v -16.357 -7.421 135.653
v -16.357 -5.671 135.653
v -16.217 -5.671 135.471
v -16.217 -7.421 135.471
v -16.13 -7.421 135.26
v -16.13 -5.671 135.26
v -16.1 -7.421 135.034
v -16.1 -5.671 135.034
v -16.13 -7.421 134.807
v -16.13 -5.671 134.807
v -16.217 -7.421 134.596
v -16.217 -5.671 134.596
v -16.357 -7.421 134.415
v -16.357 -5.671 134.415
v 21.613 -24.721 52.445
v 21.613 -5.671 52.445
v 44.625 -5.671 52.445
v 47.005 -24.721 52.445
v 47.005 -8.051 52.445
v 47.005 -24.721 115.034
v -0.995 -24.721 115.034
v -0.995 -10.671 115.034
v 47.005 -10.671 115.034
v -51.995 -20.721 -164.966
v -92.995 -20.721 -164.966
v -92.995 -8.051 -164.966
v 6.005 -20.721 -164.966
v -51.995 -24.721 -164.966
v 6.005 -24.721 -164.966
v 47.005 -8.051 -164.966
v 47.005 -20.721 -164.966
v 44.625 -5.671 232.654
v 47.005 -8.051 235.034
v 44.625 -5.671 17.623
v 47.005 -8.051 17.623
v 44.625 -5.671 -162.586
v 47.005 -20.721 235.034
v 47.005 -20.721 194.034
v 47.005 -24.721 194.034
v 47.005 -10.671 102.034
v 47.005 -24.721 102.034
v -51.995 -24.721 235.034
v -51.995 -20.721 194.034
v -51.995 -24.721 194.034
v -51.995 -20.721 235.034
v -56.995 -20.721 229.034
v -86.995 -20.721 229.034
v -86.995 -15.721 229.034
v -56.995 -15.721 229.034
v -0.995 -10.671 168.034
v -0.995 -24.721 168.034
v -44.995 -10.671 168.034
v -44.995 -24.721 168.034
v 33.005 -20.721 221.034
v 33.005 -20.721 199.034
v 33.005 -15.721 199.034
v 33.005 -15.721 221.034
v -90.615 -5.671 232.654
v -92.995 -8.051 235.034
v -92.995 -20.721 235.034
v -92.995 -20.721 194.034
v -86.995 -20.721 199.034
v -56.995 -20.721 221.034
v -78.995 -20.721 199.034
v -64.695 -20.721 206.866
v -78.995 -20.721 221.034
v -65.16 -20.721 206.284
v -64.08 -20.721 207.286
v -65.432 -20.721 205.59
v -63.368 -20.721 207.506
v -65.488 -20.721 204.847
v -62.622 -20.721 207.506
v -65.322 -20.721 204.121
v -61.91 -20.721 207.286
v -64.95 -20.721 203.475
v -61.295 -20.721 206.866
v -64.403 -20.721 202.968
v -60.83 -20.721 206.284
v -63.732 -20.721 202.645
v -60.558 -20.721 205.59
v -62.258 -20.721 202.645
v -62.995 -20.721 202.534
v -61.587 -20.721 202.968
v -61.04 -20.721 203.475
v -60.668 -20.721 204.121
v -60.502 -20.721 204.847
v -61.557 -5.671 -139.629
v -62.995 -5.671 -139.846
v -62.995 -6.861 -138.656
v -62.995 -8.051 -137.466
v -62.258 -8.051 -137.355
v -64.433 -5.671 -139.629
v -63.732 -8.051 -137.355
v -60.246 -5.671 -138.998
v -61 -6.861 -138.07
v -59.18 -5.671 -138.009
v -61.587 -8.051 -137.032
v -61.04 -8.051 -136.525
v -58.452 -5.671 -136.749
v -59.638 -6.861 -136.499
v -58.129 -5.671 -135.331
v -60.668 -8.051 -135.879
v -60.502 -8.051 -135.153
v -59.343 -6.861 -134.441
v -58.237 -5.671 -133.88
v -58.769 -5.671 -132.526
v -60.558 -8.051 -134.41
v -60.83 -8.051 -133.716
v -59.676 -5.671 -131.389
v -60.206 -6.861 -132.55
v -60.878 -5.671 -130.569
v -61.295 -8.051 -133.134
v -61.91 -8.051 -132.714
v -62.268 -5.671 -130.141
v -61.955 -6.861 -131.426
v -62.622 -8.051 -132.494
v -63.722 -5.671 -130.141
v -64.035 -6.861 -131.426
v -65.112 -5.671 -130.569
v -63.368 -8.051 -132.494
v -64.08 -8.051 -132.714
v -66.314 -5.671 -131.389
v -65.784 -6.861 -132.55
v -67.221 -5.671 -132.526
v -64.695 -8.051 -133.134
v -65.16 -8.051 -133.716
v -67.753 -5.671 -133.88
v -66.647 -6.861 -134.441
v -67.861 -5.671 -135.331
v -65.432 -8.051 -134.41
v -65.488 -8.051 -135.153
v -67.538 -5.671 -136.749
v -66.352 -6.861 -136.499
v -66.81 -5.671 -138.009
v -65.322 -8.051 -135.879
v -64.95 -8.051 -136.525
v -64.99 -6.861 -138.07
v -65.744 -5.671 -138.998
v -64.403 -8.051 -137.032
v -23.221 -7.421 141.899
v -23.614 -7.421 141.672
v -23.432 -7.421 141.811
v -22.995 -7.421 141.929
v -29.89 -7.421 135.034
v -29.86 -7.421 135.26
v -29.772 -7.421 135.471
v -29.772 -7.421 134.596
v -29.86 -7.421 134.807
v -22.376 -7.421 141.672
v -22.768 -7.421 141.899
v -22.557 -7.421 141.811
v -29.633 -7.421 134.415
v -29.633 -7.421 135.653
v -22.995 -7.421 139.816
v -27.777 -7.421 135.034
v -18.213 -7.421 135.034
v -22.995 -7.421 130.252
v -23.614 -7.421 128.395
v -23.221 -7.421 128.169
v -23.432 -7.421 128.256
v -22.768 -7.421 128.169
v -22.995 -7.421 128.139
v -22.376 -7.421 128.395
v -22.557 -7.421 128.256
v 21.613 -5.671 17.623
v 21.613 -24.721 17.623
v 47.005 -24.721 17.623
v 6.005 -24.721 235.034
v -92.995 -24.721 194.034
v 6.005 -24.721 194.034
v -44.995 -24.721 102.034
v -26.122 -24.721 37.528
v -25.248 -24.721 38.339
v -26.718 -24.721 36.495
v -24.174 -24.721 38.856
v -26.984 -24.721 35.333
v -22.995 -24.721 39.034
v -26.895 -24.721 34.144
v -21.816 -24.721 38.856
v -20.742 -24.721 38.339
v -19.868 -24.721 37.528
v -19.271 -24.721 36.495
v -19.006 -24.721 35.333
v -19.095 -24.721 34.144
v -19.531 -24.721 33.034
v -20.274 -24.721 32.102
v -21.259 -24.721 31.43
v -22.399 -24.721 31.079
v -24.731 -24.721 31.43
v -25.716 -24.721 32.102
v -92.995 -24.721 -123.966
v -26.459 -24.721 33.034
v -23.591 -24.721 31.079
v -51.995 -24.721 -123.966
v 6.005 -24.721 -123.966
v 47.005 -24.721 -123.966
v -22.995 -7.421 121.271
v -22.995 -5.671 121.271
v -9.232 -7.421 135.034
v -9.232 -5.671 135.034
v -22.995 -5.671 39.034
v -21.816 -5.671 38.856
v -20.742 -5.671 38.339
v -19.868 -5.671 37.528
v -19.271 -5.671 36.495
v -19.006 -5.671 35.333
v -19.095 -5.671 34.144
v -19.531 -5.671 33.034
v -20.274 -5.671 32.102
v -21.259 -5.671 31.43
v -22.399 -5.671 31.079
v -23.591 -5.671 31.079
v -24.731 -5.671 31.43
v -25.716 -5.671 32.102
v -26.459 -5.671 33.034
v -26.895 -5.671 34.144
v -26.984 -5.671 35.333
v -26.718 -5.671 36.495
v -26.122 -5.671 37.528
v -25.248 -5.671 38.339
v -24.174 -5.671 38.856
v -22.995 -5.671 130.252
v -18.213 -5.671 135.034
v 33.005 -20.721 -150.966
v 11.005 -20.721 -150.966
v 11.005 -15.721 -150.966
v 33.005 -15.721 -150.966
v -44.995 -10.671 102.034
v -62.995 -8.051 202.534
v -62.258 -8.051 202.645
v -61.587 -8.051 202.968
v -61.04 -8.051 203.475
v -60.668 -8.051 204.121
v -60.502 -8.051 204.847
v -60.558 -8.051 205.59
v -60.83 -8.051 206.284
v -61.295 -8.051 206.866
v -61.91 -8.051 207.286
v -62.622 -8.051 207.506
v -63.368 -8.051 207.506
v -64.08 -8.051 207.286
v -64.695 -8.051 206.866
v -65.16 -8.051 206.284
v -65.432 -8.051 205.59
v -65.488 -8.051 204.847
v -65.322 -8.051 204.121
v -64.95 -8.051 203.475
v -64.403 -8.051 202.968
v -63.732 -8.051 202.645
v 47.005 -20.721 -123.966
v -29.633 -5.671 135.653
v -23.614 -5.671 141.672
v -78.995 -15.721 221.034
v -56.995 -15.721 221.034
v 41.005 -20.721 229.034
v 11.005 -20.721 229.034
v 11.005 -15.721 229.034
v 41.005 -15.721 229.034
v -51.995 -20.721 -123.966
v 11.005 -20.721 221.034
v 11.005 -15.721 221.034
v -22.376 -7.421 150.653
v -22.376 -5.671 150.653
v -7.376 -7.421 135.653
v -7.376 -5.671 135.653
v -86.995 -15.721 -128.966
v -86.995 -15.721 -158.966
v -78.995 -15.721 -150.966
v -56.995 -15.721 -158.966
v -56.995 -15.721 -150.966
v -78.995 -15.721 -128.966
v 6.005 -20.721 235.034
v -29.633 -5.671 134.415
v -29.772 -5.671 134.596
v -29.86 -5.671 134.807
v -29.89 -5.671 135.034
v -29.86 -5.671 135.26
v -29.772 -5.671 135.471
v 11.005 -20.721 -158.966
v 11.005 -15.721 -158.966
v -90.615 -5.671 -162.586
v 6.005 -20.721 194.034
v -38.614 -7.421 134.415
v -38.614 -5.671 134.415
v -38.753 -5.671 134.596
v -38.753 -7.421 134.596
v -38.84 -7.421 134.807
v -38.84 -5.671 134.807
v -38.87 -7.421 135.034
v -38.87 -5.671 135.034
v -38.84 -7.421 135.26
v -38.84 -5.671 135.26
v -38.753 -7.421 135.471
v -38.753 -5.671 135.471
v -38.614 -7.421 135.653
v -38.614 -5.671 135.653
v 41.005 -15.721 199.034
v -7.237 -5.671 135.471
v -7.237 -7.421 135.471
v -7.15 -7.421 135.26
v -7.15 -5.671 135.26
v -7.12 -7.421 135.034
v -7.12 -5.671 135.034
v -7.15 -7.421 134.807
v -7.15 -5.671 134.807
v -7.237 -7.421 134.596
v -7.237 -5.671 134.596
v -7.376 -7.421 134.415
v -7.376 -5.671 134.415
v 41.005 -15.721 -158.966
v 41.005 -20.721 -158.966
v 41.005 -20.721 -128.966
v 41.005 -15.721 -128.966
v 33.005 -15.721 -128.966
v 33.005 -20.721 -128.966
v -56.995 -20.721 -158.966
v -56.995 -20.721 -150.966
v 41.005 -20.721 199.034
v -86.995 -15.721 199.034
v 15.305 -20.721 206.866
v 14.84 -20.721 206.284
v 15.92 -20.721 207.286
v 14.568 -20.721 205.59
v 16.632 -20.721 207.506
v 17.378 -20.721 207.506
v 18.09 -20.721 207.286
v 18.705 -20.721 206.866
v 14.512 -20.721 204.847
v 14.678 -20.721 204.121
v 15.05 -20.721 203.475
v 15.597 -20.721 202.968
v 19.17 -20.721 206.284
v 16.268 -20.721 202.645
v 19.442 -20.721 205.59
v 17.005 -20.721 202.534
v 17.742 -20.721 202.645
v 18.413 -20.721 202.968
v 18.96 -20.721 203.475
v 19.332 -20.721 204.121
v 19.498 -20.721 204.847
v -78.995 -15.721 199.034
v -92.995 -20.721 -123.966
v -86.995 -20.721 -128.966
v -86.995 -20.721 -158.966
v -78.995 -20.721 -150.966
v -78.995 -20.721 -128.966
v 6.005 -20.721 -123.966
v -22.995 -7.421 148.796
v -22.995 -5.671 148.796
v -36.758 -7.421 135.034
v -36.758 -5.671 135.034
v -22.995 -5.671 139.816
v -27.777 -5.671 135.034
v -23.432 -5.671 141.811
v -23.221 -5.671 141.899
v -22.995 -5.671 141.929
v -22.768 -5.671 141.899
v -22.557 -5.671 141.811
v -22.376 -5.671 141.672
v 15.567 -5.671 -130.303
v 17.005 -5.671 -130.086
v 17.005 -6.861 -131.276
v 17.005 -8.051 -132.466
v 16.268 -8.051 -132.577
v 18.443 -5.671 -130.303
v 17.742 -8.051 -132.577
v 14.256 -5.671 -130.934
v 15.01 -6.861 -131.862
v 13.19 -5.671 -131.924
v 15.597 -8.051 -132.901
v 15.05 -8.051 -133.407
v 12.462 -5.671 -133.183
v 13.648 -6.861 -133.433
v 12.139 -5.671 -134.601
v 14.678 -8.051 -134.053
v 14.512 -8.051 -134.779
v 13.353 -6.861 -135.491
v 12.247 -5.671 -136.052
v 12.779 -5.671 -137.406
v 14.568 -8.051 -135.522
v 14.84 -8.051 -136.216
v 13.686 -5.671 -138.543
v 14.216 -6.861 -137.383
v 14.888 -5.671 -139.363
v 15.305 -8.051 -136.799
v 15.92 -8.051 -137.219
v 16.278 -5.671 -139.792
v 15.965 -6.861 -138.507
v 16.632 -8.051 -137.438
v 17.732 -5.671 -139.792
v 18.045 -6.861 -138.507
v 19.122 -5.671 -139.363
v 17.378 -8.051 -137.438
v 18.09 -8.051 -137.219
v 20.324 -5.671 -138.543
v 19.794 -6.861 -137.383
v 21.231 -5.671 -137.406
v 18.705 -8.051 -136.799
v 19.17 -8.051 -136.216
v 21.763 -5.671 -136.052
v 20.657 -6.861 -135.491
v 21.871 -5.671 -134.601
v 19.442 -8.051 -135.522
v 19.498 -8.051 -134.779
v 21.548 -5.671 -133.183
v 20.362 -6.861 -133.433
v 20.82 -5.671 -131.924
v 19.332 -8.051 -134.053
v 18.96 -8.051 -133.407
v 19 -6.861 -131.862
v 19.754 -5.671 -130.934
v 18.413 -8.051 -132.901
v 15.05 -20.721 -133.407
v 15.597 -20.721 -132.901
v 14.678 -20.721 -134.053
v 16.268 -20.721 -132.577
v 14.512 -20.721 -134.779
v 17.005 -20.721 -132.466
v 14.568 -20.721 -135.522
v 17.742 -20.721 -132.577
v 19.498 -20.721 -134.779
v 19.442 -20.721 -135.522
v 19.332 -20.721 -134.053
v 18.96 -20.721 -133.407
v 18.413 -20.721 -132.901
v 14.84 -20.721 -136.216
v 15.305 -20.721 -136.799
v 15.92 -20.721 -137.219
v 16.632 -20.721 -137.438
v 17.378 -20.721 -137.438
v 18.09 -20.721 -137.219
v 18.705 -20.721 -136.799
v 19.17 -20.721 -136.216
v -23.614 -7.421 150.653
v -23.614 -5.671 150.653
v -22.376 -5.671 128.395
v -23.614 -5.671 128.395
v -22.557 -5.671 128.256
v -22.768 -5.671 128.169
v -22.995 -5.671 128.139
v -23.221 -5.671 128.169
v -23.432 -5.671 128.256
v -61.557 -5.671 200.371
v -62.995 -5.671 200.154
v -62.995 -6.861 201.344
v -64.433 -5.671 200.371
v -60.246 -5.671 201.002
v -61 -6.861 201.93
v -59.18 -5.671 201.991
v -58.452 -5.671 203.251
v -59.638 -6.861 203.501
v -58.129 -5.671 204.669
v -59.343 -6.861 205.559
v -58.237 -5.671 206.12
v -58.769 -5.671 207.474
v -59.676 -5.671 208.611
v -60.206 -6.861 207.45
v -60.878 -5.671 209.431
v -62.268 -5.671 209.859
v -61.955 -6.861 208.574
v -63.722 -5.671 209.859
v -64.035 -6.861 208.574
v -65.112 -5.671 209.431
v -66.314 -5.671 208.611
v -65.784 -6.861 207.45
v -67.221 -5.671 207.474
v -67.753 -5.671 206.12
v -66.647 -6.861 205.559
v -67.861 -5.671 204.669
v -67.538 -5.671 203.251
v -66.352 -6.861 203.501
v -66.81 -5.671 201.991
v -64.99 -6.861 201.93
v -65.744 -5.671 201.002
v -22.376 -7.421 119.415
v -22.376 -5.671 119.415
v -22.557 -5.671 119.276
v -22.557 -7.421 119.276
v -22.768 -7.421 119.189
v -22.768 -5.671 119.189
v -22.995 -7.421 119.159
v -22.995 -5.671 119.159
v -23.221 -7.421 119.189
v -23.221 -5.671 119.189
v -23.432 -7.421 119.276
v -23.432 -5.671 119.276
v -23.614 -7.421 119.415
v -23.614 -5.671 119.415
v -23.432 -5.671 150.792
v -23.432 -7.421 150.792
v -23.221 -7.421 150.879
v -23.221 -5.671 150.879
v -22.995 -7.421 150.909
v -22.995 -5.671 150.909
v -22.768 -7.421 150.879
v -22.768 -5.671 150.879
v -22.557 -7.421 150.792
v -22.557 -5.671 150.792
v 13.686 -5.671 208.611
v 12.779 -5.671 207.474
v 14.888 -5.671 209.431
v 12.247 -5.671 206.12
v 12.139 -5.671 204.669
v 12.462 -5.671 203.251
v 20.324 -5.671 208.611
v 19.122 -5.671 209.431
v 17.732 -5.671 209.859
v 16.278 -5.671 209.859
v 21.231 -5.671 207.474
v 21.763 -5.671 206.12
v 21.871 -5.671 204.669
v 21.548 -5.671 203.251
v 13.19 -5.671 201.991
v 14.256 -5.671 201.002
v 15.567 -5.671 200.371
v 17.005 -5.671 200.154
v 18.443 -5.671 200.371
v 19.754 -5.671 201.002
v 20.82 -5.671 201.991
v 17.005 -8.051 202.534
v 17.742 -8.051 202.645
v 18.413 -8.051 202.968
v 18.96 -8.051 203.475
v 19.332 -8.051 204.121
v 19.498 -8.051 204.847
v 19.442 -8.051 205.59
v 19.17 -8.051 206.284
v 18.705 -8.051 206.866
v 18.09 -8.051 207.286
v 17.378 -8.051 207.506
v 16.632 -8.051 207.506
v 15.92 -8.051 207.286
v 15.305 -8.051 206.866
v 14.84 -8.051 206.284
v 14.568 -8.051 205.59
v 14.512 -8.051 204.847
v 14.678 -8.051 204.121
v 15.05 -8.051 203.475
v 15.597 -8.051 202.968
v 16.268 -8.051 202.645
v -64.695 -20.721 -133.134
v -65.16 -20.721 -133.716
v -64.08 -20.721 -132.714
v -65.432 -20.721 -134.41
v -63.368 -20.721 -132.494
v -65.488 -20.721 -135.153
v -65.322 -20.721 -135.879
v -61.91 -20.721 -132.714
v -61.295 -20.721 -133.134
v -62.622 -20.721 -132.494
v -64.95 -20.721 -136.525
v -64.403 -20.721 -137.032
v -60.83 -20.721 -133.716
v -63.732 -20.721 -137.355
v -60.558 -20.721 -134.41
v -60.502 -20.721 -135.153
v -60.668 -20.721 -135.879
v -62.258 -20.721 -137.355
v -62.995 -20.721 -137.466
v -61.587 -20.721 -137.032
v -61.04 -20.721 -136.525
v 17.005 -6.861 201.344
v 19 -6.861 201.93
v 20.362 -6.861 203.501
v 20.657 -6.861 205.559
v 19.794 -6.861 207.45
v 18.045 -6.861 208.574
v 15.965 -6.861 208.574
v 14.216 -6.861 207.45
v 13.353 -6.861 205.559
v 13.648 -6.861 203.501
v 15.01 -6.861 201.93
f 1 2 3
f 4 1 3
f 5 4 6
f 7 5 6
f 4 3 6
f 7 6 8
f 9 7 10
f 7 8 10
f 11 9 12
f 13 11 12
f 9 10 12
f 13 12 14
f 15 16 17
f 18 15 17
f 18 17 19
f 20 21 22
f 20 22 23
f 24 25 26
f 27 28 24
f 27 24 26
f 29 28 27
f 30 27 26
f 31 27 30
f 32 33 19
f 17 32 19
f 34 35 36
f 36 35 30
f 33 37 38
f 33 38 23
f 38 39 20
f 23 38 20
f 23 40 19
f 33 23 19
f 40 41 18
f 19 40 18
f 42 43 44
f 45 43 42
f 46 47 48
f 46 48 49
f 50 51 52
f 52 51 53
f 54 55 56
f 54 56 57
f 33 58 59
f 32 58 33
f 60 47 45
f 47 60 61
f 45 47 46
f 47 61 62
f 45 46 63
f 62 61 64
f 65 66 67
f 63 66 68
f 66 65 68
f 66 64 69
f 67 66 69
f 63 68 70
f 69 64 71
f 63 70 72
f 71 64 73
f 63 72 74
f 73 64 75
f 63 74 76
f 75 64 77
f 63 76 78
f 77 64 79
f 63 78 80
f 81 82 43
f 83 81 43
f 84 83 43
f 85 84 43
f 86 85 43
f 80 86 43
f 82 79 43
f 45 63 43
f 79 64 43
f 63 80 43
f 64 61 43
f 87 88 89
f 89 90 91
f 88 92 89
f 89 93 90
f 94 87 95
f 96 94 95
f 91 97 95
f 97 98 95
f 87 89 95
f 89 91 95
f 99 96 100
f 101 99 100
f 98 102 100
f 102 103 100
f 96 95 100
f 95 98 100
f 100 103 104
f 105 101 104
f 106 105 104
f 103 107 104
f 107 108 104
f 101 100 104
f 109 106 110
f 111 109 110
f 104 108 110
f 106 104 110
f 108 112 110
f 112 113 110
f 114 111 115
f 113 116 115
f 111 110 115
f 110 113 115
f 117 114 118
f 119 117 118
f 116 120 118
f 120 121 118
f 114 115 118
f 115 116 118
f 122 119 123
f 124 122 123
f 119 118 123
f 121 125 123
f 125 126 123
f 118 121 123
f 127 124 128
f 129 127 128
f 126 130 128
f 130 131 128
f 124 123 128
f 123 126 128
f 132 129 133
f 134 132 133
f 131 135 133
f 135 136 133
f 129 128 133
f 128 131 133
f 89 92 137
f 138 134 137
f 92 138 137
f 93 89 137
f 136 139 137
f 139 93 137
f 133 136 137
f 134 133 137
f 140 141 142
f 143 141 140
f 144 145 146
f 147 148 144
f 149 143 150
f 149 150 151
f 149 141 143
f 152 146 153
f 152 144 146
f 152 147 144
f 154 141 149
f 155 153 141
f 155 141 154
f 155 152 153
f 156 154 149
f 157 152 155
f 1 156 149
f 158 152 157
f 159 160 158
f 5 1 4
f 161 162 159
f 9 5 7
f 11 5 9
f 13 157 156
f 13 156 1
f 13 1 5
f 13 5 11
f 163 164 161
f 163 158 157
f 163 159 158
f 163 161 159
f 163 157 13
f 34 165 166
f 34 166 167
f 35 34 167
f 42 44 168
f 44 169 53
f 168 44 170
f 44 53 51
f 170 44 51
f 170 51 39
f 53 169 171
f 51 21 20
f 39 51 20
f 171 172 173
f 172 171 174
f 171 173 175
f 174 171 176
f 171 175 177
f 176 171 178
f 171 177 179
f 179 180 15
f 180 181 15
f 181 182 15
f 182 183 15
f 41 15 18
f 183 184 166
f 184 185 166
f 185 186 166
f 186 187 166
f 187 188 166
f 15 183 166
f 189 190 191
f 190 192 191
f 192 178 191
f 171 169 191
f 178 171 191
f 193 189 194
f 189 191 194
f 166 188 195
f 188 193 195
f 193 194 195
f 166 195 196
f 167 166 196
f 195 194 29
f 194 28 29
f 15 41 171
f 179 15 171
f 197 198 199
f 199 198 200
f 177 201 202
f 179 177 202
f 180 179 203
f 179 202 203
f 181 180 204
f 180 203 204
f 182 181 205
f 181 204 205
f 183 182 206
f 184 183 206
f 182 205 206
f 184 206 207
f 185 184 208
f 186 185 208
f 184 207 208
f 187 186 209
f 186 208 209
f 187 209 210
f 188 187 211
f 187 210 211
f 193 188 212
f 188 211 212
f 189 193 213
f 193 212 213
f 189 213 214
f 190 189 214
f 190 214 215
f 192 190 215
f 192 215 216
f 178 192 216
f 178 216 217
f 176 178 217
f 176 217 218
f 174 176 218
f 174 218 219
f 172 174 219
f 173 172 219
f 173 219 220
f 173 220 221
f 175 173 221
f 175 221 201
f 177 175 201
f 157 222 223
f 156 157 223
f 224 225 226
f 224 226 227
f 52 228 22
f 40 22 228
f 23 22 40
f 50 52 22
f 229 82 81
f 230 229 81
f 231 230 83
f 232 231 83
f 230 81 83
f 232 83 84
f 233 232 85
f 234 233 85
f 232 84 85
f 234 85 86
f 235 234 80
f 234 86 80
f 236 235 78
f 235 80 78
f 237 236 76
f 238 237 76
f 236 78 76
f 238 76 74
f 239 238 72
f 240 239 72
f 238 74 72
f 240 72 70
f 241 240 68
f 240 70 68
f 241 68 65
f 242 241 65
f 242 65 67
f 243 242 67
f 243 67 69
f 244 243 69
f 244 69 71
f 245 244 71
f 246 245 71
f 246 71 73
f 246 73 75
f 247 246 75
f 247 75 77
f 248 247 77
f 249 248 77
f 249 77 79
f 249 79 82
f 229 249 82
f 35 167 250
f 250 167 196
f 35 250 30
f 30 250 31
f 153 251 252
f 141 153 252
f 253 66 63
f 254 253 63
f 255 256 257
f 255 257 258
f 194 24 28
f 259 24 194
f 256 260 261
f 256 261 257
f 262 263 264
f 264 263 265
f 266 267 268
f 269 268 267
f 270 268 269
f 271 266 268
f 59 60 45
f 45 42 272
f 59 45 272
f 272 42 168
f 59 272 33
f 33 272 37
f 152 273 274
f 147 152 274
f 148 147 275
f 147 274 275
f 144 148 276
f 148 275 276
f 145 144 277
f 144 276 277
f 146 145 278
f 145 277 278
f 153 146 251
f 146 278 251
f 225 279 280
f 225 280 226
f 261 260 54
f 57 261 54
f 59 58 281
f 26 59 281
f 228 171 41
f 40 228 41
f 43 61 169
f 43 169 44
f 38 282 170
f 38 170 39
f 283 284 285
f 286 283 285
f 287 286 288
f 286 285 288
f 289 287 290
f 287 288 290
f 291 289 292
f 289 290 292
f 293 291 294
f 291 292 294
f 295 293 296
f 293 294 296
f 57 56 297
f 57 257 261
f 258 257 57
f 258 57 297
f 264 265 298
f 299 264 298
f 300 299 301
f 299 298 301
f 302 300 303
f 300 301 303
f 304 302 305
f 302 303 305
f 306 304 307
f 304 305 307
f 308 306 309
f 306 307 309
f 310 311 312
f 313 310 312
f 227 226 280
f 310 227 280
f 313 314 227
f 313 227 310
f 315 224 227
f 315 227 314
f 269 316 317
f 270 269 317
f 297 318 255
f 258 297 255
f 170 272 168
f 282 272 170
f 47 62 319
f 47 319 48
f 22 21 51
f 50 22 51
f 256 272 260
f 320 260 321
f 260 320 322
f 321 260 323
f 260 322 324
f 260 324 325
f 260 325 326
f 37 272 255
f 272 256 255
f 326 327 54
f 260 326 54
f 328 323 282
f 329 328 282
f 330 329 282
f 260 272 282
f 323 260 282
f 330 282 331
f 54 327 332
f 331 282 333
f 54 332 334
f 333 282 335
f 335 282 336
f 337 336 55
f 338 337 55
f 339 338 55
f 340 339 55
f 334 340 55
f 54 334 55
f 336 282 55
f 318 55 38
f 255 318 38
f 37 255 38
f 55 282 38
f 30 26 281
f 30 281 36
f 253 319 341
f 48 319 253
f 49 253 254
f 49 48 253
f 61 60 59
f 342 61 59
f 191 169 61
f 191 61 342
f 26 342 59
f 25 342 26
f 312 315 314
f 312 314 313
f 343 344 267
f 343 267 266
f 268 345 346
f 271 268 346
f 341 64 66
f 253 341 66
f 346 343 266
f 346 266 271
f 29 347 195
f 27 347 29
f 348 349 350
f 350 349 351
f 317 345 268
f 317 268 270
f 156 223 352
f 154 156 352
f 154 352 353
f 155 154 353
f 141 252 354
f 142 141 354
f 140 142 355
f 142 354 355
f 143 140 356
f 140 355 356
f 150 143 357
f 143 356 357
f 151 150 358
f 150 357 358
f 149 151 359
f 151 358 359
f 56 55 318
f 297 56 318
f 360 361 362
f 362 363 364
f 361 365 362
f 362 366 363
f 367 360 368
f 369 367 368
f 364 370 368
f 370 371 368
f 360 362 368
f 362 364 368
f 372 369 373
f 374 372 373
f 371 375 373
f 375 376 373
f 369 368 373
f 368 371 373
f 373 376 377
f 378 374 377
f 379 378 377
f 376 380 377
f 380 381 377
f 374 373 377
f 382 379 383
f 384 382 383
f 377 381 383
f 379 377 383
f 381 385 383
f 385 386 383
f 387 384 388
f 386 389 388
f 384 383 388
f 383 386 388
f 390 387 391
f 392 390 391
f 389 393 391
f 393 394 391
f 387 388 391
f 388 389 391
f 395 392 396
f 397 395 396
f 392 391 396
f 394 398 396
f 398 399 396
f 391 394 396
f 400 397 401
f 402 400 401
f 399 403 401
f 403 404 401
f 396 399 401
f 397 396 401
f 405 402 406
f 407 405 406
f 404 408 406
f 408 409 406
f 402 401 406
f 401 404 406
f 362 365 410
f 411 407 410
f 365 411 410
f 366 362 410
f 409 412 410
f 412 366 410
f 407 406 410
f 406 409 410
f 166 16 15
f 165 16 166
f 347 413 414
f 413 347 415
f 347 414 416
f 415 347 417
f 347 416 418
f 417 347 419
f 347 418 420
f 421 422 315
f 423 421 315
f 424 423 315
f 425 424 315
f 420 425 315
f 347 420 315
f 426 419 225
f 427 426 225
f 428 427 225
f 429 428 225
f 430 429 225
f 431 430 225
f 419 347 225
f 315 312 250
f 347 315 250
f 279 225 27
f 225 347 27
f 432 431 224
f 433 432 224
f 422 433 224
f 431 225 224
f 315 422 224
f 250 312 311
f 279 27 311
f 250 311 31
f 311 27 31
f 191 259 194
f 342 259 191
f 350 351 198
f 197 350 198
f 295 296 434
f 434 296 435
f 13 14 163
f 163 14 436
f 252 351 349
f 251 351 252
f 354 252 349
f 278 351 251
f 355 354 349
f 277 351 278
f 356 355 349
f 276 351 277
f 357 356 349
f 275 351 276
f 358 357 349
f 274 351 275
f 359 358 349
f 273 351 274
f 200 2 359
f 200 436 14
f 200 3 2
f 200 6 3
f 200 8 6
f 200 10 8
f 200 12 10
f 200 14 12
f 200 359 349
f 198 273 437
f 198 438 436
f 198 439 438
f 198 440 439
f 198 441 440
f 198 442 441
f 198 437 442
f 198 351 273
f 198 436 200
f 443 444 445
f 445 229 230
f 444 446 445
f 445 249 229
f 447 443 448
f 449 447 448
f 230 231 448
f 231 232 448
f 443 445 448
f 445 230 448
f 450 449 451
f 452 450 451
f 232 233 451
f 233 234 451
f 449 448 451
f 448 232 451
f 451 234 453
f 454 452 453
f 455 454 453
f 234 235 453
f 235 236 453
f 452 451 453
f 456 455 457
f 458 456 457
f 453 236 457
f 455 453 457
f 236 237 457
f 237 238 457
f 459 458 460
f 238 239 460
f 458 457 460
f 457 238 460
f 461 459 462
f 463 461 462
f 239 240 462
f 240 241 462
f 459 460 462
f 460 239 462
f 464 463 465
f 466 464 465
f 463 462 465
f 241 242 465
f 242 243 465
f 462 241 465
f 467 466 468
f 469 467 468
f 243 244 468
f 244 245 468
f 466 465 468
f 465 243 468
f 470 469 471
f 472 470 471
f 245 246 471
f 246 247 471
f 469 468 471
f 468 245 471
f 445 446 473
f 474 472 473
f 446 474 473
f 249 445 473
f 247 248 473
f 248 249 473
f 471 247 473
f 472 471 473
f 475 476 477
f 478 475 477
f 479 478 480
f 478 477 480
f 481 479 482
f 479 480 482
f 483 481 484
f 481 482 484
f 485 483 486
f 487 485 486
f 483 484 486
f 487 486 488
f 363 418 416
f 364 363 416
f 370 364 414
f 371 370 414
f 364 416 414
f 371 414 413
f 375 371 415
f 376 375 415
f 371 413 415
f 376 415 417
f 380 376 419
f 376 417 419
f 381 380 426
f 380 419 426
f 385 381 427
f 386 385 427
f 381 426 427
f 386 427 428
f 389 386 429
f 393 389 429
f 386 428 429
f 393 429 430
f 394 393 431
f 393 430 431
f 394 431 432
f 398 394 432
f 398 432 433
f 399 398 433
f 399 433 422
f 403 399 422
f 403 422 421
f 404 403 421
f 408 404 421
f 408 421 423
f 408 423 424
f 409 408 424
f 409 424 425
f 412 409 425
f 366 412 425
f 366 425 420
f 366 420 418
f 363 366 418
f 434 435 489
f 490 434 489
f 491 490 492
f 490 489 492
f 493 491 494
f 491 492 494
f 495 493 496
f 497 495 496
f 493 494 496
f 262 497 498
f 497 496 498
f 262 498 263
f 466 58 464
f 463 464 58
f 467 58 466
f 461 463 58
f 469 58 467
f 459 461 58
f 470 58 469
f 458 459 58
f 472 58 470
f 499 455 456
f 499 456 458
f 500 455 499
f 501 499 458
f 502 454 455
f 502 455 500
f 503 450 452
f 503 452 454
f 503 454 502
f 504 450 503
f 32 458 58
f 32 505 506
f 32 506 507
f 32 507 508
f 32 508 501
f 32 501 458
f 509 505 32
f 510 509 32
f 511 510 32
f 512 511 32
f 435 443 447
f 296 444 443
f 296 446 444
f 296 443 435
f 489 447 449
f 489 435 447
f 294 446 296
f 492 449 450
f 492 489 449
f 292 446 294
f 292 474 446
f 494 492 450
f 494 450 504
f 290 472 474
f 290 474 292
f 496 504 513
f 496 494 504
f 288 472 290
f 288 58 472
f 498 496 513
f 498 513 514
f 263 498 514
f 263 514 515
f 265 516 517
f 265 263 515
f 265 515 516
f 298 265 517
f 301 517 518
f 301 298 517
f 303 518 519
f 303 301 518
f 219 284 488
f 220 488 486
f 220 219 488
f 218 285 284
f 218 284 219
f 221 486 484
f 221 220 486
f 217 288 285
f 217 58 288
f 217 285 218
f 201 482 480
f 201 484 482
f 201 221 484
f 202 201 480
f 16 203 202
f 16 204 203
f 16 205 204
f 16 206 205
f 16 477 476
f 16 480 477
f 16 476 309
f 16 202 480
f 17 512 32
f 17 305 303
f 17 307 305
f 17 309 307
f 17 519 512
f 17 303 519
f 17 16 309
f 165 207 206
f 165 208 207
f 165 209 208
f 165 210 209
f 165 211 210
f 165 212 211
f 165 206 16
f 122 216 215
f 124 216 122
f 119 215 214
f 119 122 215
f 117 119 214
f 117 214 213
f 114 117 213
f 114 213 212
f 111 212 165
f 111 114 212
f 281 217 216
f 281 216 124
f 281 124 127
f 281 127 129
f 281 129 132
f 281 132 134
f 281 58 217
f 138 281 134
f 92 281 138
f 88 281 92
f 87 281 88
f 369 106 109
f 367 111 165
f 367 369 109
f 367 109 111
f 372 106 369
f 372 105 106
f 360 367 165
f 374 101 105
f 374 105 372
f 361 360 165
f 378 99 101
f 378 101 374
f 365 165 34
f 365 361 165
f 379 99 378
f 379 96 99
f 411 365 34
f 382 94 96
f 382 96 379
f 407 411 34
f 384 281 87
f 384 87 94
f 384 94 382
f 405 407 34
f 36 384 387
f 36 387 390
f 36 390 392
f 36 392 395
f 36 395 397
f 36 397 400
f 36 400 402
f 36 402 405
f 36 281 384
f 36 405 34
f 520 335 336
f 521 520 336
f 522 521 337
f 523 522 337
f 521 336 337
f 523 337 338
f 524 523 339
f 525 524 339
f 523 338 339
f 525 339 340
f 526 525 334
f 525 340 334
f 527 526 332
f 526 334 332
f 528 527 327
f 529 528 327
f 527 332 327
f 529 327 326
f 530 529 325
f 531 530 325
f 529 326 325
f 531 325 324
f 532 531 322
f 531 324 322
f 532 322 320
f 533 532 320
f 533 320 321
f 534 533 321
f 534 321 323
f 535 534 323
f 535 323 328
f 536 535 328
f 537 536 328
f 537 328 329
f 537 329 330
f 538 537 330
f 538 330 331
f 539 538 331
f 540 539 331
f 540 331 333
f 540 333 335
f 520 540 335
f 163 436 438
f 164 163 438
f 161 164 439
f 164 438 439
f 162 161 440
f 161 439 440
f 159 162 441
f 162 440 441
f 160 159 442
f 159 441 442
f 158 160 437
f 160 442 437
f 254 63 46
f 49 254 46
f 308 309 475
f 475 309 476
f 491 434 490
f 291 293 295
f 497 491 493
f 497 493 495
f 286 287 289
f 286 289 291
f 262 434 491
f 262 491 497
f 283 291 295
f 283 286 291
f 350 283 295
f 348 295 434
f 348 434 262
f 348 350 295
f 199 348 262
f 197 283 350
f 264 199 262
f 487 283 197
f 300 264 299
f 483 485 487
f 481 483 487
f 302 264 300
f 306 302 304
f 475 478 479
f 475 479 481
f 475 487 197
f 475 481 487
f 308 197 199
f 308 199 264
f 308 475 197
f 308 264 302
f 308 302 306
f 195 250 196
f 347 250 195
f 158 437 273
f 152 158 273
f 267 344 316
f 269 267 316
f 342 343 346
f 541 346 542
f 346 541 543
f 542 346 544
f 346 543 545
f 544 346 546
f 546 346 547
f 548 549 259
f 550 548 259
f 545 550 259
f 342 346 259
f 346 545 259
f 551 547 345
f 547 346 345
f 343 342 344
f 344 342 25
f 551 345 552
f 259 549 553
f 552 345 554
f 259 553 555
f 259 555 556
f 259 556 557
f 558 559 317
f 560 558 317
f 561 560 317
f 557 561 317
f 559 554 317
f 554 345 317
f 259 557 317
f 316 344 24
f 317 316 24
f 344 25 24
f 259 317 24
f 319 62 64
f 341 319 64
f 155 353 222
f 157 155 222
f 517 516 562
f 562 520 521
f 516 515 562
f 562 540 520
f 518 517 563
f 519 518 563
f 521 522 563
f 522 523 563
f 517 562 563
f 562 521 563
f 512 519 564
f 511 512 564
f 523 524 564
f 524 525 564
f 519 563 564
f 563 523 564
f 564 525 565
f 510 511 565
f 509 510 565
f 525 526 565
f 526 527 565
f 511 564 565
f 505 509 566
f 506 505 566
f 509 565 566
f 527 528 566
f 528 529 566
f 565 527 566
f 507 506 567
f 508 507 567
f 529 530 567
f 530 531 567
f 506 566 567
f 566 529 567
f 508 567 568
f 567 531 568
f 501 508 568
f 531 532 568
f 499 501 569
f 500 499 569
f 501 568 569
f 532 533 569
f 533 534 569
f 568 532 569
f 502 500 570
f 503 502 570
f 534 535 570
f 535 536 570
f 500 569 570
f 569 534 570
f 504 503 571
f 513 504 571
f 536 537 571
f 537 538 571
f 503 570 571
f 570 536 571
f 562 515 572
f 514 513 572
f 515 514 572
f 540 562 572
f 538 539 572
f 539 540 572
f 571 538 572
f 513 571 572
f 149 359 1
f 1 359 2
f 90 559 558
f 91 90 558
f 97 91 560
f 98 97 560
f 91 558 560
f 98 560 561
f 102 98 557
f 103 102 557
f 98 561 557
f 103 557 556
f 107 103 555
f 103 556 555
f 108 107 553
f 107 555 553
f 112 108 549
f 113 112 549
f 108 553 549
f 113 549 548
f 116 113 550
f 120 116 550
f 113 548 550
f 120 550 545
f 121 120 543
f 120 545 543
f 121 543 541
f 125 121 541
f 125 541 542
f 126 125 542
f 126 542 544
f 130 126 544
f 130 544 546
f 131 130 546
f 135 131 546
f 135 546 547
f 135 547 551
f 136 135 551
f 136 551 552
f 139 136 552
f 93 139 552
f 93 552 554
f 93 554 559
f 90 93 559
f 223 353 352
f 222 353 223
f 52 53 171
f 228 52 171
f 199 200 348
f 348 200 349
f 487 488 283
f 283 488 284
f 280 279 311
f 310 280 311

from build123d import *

# Parameters (mm, degrees)
BOSS_EXTRUDE1_DEPTH = 4
SKETCH2_W           = 140
SKETCH2_H           = 400
BOSS_EXTRUDE2_DEPTH = 15.05
SKETCH3_W           = 8
SKETCH3_H           = 22
SKETCH3_H_2         = 8
SKETCH3_W_2         = 22
SKETCH3_R           = 2.5
CUT_EXTRUDE1_DEPTH  = 5
CUT_EXTRUDE2_REACH  = 255.21
SKETCH4_R           = 2.5
CHAMFER1_SIZE       = 2.38
CUT_EXTRUDE3_REACH  = 255.48
SKETCH5_R           = 4
CUT_EXTRUDE4_DEPTH  = 1.75
SKETCH7_W           = 50
SKETCH7_H           = 13
CUT_EXTRUDE5_DEPTH  = 14.05
CUT_EXTRUDE6_REACH  = 255.48
SKETCH8_W           = 25.391909776
SKETCH8_H           = 34.82217309


with BuildPart() as part:
    # Sketch1 → Boss-Extrude1 (new body)
    with BuildSketch(Plane(origin=(0, -20.720705818, 0), x_dir=(1, 0, 0), z_dir=(0, 1, 0))):
        Polygon((6.005034784, -235.03386434), (6.005034784, -194.03386434), (47.005034784, -194.03386434), (47.005034784, 123.96613566), (6.005034784, 123.96613566), (6.005034784, 164.96613566), (-51.994965216, 164.96613566), (-51.994965216, 123.96613566), (-92.994965216, 123.96613566), (-92.994965216, -194.03386434), (-51.994965216, -194.03386434), (-51.994965216, -235.03386434), align=None)
    extrude(amount=-BOSS_EXTRUDE1_DEPTH)

    # Sketch2 → Boss-Extrude2 (add)
    with BuildSketch(Plane(origin=(0, -20.720705818, 0), x_dir=(1, 0, 0), z_dir=(0, 1, 0))):
        with Locations((-22.994965216, -35.03386434)):
            Rectangle(SKETCH2_W, SKETCH2_H)
    extrude(amount=BOSS_EXTRUDE2_DEPTH)

    # Sketch3 → Cut-Extrude1 (cut)
    # profile 1 of 14: a face of its own
    with BuildSketch(Plane.XZ.offset(20.720705818)):
        with Locations((37.005034784, 210.03386434)):
            Rectangle(SKETCH3_W, SKETCH3_H)
    # profile 2 of 14: a face of its own
    with BuildSketch(Plane.XZ.offset(20.720705818)):
        with Locations((37.005034784, 225.03386434)):
            Rectangle(SKETCH3_W, SKETCH3_H_2)
    # profile 3 of 14: a face of its own
    with BuildSketch(Plane.XZ.offset(20.720705818)):
        with Locations((22.005034784, 225.03386434)):
            Rectangle(SKETCH3_W_2, SKETCH3_H_2)
    # profile 4 of 14: a face of its own
    with BuildSketch(Plane.XZ.offset(20.720705818)):
        with Locations((-67.994965216, 225.03386434)):
            Rectangle(SKETCH3_W_2, SKETCH3_H_2)
    # profile 5 of 14: a face of its own
    with BuildSketch(Plane.XZ.offset(20.720705818)):
        with Locations((-82.994965216, 210.03386434)):
            Rectangle(SKETCH3_W, SKETCH3_H)
    # profile 6 of 14: a face of its own
    with BuildSketch(Plane.XZ.offset(20.720705818)):
        with Locations((-82.994965216, 225.03386434)):
            Rectangle(SKETCH3_W, SKETCH3_H_2)
        with Locations((-82.994965216, 225.03386434)):
            Circle(SKETCH3_R, mode=Mode.SUBTRACT)
    # profile 7 of 14: a face of its own
    with BuildSketch(Plane.XZ.offset(20.720705818)):
        with Locations((-82.994965216, 225.03386434)):
            Circle(SKETCH3_R)
    # profile 8 of 14: a face of its own
    with BuildSketch(Plane.XZ.offset(20.720705818)):
        with Locations((-67.994965216, -154.96613566)):
            Rectangle(SKETCH3_W_2, SKETCH3_H_2)
    # profile 9 of 14: a face of its own
    with BuildSketch(Plane.XZ.offset(20.720705818)):
        with Locations((-82.994965216, -139.96613566)):
            Rectangle(SKETCH3_W, SKETCH3_H)
    # profile 10 of 14: a face of its own
    with BuildSketch(Plane.XZ.offset(20.720705818)):
        with Locations((-82.994965216, -154.96613566)):
            Rectangle(SKETCH3_W, SKETCH3_H_2)
        with Locations((-82.994965216, -154.96613566)):
            Circle(SKETCH3_R, mode=Mode.SUBTRACT)
    # profile 11 of 14: a face of its own
    with BuildSketch(Plane.XZ.offset(20.720705818)):
        with Locations((-82.994965216, -154.96613566)):
            Circle(SKETCH3_R)
    # profile 12 of 14: a face of its own
    with BuildSketch(Plane.XZ.offset(20.720705818)):
        with Locations((37.005034784, -154.96613566)):
            Rectangle(SKETCH3_W, SKETCH3_H_2)
    # profile 13 of 14: a face of its own
    with BuildSketch(Plane.XZ.offset(20.720705818)):
        with Locations((22.005034784, -154.96613566)):
            Rectangle(SKETCH3_W_2, SKETCH3_H_2)
    # profile 14 of 14: a face of its own
    with BuildSketch(Plane.XZ.offset(20.720705818)):
        with Locations((37.005034784, -139.96613566)):
            Rectangle(SKETCH3_W, SKETCH3_H)
    extrude(amount=-CUT_EXTRUDE1_DEPTH, mode=Mode.SUBTRACT)

    # Sketch4 → Cut-Extrude2 (cut, up to next)
    with BuildSketch(Plane.XZ.offset(20.720705818), mode=Mode.PRIVATE) as cut_extrude2_sk1:
        with Locations(Location((-62.994965216, -134.96613566, 0), (0, 0, 270))):
            Circle(SKETCH4_R)
    cut_extrude2_tool1 = extrude(cut_extrude2_sk1.sketch, amount=-CUT_EXTRUDE2_REACH, mode=Mode.PRIVATE) & part.part
    # Sketch4 → Cut-Extrude2 (cut, up to next)
    with BuildSketch(Plane.XZ.offset(20.720705818), mode=Mode.PRIVATE) as cut_extrude2_sk2:
        with Locations(Location((17.005034784, -134.96613566, 0), (0, 0, 90))):
            Circle(SKETCH4_R)
    cut_extrude2_tool2 = extrude(cut_extrude2_sk2.sketch, amount=-CUT_EXTRUDE2_REACH, mode=Mode.PRIVATE) & part.part
    # Sketch4 → Cut-Extrude2 (cut, up to next)
    with BuildSketch(Plane.XZ.offset(20.720705818), mode=Mode.PRIVATE) as cut_extrude2_sk3:
        with Locations(Location((-62.994965216, 205.03386434, 0), (0, 0, 270))):
            Circle(SKETCH4_R)
    cut_extrude2_tool3 = extrude(cut_extrude2_sk3.sketch, amount=-CUT_EXTRUDE2_REACH, mode=Mode.PRIVATE) & part.part
    # Sketch4 → Cut-Extrude2 (cut, up to next)
    with BuildSketch(Plane.XZ.offset(20.720705818), mode=Mode.PRIVATE) as cut_extrude2_sk4:
        with Locations(Location((17.005034784, 205.03386434, 0), (0, 0, 270))):
            Circle(SKETCH4_R)
    cut_extrude2_tool4 = extrude(cut_extrude2_sk4.sketch, amount=-CUT_EXTRUDE2_REACH, mode=Mode.PRIVATE) & part.part
    add(cut_extrude2_tool1.solids().sort_by_distance((-62.994965, -20.720706, -134.966136))[0], mode=Mode.SUBTRACT)
    add(cut_extrude2_tool2.solids().sort_by_distance((17.005035, -20.720706, -134.966136))[0], mode=Mode.SUBTRACT)
    add(cut_extrude2_tool3.solids().sort_by_distance((-62.994965, -20.720706, 205.033864))[0], mode=Mode.SUBTRACT)
    add(cut_extrude2_tool4.solids().sort_by_distance((17.005035, -20.720706, 205.033864))[0], mode=Mode.SUBTRACT)

    # Chamfer1
    chamfer1_edges = [part.edges().sort_by_distance(p)[0] for p in [
        (17.005034784, -5.670705818, -137.46613566),
        (-62.994965216, -5.670705818, 207.53386434),
        (17.005034784, -5.670705818, 207.53386434),
        (-62.994965216, -5.670705818, -132.46613566),
        (-92.994965216, -5.670705818, 35.03386434),
        (-22.994965216, -5.670705818, 235.03386434),
        (47.005034784, -5.670705818, 35.03386434),
        (-22.994965216, -5.670705818, -164.96613566),
    ]]
    chamfer(chamfer1_edges, length=CHAMFER1_SIZE)

    # Sketch5 → Cut-Extrude3 (cut, up to next)
    with BuildSketch(Plane(origin=(0, -5.670705818, 0), x_dir=(1, 0, 0), z_dir=(0, 1, 0)), mode=Mode.PRIVATE) as cut_extrude3_sk1:
        with Locations(Location((-22.994965216, -35.03386434, 0), (0, 0, 270))):
            Circle(SKETCH5_R)
    cut_extrude3_tool1 = extrude(cut_extrude3_sk1.sketch, amount=-CUT_EXTRUDE3_REACH, mode=Mode.PRIVATE) & part.part
    add(cut_extrude3_tool1.solids().sort_by_distance((-22.994965, -5.670706, 35.033864))[0], mode=Mode.SUBTRACT)

    # Sketch6 → Cut-Extrude4 (cut)
    # profile 1 of 2: a face of its own
    with BuildSketch(Plane(origin=(0, -5.670705818, 0), x_dir=(1, 0, 0), z_dir=(0, 1, 0))):
        with BuildLine():
            Line((-38.613683649, -135.652582773), (-23.613683649, -150.652582773))
            ThreePointArc((-23.613683649, -150.652582773), (-22.994965216, -150.90886434), (-22.376246782, -150.652582773))
            Line((-22.376246782, -150.652582773), (-7.376246782, -135.652582773))
            ThreePointArc((-7.376246782, -135.652582773), (-7.119965216, -135.03386434), (-7.376246782, -134.415145906))
            Line((-7.376246782, -134.415145906), (-22.376246782, -119.415145906))
            ThreePointArc((-22.376246782, -119.415145906), (-22.994965216, -119.15886434), (-23.613683649, -119.415145906))
            Line((-23.613683649, -119.415145906), (-38.613683649, -134.415145906))
            ThreePointArc((-38.613683649, -134.415145906), (-38.869965216, -135.03386434), (-38.613683649, -135.652582773))
        make_face()
        Polygon((-9.232402083, -135.03386434), (-22.994965216, -148.796427473), (-36.757528349, -135.03386434), (-22.994965216, -121.271301207), align=None, mode=Mode.SUBTRACT)
    # profile 2 of 2: a face of its own
    with BuildSketch(Plane(origin=(0, -5.670705818, 0), x_dir=(1, 0, 0), z_dir=(0, 1, 0))):
        with BuildLine():
            Line((-22.376246782, -141.672326652), (-16.356502903, -135.652582773))
            ThreePointArc((-16.356502903, -135.652582773), (-16.100221337, -135.03386434), (-16.356502903, -134.415145906))
            Line((-16.356502903, -134.415145906), (-22.376246782, -128.395402027))
            ThreePointArc((-22.376246782, -128.395402027), (-22.994965216, -128.139120461), (-23.613683649, -128.395402027))
            Line((-23.613683649, -128.395402027), (-29.633427528, -134.415145906))
            ThreePointArc((-29.633427528, -134.415145906), (-29.889709095, -135.03386434), (-29.633427528, -135.652582773))
            Line((-29.633427528, -135.652582773), (-23.613683649, -141.672326652))
            ThreePointArc((-23.613683649, -141.672326652), (-22.994965216, -141.928608219), (-22.376246782, -141.672326652))
        make_face()
        Polygon((-22.994965216, -130.251557328), (-18.212658204, -135.03386434), (-22.994965216, -139.816171352), (-27.777272227, -135.03386434), align=None, mode=Mode.SUBTRACT)
    extrude(amount=-CUT_EXTRUDE4_DEPTH, mode=Mode.SUBTRACT)

    # Sketch7 → Cut-Extrude5 (cut)
    with BuildSketch(Plane.XZ.offset(24.720705818)):
        Polygon((-0.994965216, 115.03386434), (-0.994965216, 168.03386434), (-44.994965216, 168.03386434), (-44.994965216, 102.03386434), (-0.994965216, 102.03386434), align=None)
        with Locations((24.005034784, 108.53386434)):
            Rectangle(SKETCH7_W, SKETCH7_H)
    extrude(amount=-CUT_EXTRUDE5_DEPTH, mode=Mode.SUBTRACT)

    # Sketch8 → Cut-Extrude6 (cut, up to next)
    with BuildSketch(Plane(origin=(0, -5.670705818, 0), x_dir=(1, 0, 0), z_dir=(0, 1, 0)), mode=Mode.PRIVATE) as cut_extrude6_sk1:
        with Locations((34.309079896, -35.03386434)):
            Rectangle(SKETCH8_W, SKETCH8_H)
    cut_extrude6_tool1 = extrude(cut_extrude6_sk1.sketch, amount=-CUT_EXTRUDE6_REACH, mode=Mode.PRIVATE) & part.part
    add(cut_extrude6_tool1.solids().sort_by_distance((34.30908, -5.670706, 35.033864))[0], mode=Mode.SUBTRACT)


solid = part.part
